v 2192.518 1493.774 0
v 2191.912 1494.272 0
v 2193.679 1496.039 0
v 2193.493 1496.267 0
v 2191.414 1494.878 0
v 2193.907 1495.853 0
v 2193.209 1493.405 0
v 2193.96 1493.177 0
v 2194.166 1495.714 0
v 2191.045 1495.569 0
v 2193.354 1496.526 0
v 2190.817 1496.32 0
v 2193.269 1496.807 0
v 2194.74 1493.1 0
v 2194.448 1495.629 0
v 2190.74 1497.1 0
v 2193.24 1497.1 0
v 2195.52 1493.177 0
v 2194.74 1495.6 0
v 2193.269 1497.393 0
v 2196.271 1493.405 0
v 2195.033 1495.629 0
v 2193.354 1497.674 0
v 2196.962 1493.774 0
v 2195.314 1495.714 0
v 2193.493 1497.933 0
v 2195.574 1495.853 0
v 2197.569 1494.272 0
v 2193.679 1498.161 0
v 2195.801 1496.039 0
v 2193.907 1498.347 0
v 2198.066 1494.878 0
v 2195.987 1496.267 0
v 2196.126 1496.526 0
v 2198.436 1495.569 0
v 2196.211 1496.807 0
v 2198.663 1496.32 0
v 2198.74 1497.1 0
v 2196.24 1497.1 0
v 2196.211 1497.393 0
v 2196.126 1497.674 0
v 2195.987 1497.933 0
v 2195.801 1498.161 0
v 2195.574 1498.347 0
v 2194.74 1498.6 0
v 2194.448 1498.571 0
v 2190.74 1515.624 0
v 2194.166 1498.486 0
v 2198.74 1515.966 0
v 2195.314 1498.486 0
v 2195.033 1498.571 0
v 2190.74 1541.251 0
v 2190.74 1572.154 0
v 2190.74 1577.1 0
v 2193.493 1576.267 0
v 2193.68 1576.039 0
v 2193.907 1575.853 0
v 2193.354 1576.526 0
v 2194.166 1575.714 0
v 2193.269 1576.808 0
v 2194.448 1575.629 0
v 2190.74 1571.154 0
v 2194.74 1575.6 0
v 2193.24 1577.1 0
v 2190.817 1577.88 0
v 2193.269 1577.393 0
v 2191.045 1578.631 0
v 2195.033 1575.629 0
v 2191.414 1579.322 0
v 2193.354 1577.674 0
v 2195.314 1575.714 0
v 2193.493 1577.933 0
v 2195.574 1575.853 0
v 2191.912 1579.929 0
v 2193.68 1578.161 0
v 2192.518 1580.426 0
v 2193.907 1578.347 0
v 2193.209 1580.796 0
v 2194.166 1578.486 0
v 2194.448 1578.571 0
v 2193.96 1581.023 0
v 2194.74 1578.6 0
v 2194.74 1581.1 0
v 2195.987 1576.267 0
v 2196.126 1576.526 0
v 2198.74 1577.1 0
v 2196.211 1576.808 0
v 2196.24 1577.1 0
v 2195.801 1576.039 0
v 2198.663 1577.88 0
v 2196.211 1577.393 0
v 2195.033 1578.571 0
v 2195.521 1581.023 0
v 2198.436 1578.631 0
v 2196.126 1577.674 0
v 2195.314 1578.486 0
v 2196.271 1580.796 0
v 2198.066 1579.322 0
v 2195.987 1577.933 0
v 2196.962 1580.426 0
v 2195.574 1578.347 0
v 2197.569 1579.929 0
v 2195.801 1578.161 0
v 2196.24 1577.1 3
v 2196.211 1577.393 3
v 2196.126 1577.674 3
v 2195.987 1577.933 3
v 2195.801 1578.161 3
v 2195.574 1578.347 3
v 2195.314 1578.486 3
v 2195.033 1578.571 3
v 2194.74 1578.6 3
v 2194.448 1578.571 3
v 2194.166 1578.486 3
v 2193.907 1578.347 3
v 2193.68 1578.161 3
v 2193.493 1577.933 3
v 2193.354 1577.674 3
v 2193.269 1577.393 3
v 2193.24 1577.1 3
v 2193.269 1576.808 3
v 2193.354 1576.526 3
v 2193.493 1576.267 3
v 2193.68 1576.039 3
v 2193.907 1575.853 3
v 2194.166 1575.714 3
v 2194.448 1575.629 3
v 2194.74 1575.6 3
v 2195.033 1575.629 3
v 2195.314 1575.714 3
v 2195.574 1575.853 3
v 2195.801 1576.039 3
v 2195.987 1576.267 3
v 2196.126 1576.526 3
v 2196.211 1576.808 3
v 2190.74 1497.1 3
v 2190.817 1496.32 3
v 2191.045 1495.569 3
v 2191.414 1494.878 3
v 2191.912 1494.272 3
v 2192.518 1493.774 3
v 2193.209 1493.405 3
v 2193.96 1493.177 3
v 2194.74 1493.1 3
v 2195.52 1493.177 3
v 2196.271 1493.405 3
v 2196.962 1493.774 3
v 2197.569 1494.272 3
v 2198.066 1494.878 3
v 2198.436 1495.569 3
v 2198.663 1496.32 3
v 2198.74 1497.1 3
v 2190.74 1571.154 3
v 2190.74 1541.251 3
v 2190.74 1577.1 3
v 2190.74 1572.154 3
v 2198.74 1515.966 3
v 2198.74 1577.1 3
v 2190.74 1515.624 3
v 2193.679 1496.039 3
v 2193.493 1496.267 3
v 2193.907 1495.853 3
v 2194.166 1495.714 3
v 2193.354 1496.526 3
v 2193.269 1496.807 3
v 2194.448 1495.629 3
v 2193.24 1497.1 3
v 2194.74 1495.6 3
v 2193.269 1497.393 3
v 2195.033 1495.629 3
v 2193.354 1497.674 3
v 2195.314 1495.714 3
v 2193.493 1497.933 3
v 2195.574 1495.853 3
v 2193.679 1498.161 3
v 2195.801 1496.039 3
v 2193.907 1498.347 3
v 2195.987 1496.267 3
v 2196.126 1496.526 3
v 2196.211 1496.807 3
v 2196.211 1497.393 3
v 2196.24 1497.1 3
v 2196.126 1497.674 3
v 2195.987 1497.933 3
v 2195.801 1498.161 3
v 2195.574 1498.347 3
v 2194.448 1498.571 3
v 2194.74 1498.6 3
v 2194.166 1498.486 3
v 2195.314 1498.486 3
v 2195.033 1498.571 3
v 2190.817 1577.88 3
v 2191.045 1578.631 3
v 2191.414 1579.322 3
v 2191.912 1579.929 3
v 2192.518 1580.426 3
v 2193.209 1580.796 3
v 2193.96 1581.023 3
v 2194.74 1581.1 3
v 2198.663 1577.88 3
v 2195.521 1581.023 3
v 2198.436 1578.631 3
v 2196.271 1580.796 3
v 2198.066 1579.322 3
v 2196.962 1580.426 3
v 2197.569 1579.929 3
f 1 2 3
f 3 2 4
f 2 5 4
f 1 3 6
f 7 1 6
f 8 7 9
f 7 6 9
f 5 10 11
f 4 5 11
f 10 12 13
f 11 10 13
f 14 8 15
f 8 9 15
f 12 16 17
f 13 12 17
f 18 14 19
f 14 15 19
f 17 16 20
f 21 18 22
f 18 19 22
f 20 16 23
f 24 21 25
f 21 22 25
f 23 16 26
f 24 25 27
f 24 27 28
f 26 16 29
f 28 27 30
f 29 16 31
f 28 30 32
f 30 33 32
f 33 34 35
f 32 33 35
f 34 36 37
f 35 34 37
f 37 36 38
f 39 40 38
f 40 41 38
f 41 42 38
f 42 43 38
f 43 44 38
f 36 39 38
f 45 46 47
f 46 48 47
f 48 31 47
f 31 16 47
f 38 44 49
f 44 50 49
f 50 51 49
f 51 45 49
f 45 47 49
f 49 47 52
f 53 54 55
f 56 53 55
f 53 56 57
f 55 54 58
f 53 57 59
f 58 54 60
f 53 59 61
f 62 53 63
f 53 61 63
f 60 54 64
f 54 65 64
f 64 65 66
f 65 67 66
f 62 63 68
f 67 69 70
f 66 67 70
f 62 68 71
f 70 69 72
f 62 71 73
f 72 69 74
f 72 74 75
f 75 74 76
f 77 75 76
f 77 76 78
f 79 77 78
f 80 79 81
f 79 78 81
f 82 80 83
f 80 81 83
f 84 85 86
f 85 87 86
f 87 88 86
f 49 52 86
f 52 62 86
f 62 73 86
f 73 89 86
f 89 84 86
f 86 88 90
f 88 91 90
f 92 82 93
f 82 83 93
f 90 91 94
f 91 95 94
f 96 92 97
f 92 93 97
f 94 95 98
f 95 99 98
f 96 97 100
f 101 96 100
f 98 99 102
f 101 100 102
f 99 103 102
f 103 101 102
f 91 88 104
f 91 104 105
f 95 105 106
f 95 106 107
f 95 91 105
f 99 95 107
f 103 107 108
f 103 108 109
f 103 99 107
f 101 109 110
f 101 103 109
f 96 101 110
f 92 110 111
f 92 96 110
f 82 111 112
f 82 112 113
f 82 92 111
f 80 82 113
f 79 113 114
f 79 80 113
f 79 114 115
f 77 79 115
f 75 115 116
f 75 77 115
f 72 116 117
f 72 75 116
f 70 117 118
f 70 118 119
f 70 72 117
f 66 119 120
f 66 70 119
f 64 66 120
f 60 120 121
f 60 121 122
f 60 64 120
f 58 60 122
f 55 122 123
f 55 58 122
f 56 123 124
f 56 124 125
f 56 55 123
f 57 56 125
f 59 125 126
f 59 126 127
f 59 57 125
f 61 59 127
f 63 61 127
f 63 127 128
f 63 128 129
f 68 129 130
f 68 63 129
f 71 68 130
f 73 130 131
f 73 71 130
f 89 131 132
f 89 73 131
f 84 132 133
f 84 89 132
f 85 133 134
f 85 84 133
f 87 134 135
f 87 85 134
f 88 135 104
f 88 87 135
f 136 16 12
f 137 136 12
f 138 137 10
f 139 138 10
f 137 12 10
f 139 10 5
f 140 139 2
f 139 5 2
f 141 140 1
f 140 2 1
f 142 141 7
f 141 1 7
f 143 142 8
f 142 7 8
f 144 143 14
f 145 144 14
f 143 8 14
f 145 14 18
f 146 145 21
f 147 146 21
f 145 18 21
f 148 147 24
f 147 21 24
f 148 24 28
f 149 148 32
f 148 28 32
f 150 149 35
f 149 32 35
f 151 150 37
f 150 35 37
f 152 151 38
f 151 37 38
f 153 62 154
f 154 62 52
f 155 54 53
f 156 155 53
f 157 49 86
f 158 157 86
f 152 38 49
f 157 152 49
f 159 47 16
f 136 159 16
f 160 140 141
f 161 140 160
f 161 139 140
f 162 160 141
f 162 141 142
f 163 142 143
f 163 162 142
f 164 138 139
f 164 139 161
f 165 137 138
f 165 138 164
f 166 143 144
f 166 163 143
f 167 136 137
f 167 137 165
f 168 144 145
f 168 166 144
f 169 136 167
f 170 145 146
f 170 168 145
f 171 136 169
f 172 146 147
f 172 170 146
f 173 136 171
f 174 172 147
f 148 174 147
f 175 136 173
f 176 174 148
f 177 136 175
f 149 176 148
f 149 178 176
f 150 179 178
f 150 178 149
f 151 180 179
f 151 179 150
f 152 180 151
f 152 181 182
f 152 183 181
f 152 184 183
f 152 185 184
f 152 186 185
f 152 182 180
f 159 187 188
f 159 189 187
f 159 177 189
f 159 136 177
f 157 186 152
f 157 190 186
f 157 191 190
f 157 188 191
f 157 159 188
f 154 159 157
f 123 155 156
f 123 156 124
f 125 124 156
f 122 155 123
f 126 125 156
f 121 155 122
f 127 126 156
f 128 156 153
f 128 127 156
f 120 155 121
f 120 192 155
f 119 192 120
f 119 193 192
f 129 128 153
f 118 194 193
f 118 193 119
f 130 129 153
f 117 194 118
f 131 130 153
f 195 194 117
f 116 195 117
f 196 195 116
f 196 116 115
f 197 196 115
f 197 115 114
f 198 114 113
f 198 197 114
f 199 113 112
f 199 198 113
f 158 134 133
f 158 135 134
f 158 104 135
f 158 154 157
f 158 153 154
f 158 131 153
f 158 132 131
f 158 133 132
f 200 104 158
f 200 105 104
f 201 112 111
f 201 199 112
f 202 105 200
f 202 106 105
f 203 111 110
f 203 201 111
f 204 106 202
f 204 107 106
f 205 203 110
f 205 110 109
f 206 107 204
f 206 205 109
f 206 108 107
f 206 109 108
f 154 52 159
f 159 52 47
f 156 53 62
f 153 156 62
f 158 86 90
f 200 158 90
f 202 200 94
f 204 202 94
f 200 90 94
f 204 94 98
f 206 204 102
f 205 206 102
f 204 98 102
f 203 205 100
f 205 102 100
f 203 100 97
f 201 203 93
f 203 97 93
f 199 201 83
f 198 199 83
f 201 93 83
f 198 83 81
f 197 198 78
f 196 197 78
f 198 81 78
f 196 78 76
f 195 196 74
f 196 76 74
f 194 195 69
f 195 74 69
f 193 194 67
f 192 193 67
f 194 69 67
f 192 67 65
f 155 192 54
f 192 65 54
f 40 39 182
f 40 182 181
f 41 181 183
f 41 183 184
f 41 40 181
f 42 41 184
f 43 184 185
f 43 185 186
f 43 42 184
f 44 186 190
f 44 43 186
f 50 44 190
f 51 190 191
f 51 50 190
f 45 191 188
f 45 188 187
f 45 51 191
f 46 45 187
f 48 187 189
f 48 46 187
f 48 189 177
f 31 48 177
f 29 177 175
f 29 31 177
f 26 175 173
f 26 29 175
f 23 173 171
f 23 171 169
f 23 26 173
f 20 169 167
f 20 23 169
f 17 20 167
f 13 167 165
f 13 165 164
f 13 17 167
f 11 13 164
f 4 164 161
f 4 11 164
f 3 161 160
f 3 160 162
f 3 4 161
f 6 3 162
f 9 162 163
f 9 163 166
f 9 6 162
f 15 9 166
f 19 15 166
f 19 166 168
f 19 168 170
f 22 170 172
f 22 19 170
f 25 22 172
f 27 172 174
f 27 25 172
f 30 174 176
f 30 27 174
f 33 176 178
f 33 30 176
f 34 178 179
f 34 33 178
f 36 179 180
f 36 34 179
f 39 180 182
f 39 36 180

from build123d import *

# Parameters (mm, degrees)
SKETCH_2_R      = 1.5
EXTRUDE_1_DEPTH = 3


with BuildPart() as part:
    # 草圖2 → 填料-伸長1 (new body)
    with BuildSketch(Plane.XY):
        with BuildLine():
            Line((2198.740145456, 1572.08621907), (2198.740145456, 1577.10008841))
            ThreePointArc((2198.740145456, 1577.10008841), (2194.740145456, 1581.10008841), (2190.740145456, 1577.10008841))
            Line((2190.740145456, 1577.10008841), (2190.740145457, 1572.15435767))
            Line((2190.740145457, 1572.15435767), (2190.740145457, 1571.15435767))
            Line((2190.740145457, 1571.15435767), (2190.740145456, 1541.250580548))
            Line((2190.740145456, 1541.250580548), (2190.740145456, 1540.250580548))
            Line((2190.740145456, 1540.250580548), (2190.740145456, 1516.623912375))
            Line((2190.740145456, 1516.623912375), (2190.740145456, 1515.623912375))
            Line((2190.740145456, 1515.623912375), (2190.740145455, 1497.10018841))
            ThreePointArc((2190.740145455, 1497.10018841), (2194.740095455, 1493.100088408), (2198.740145455, 1497.100088412))
            Line((2198.740145455, 1497.100088412), (2198.740145456, 1515.966387039))
            Line((2198.740145456, 1515.966387039), (2198.740145456, 1516.966387039))
            Line((2198.740145456, 1516.966387039), (2198.740145456, 1541.60008841))
            Line((2198.740145456, 1541.60008841), (2198.740145456, 1542.60008841))
            Line((2198.740145456, 1542.60008841), (2198.740145456, 1571.08621907))
            Line((2198.740145456, 1571.08621907), (2198.740145456, 1572.08621907))
        make_face()
        with Locations((2194.740145455, 1497.100088409)):
            Circle(SKETCH_2_R, mode=Mode.SUBTRACT)
        with Locations((2194.740195453, 1577.100138407)):
            Circle(SKETCH_2_R, mode=Mode.SUBTRACT)
    extrude(amount=EXTRUDE_1_DEPTH)


solid = part.part
